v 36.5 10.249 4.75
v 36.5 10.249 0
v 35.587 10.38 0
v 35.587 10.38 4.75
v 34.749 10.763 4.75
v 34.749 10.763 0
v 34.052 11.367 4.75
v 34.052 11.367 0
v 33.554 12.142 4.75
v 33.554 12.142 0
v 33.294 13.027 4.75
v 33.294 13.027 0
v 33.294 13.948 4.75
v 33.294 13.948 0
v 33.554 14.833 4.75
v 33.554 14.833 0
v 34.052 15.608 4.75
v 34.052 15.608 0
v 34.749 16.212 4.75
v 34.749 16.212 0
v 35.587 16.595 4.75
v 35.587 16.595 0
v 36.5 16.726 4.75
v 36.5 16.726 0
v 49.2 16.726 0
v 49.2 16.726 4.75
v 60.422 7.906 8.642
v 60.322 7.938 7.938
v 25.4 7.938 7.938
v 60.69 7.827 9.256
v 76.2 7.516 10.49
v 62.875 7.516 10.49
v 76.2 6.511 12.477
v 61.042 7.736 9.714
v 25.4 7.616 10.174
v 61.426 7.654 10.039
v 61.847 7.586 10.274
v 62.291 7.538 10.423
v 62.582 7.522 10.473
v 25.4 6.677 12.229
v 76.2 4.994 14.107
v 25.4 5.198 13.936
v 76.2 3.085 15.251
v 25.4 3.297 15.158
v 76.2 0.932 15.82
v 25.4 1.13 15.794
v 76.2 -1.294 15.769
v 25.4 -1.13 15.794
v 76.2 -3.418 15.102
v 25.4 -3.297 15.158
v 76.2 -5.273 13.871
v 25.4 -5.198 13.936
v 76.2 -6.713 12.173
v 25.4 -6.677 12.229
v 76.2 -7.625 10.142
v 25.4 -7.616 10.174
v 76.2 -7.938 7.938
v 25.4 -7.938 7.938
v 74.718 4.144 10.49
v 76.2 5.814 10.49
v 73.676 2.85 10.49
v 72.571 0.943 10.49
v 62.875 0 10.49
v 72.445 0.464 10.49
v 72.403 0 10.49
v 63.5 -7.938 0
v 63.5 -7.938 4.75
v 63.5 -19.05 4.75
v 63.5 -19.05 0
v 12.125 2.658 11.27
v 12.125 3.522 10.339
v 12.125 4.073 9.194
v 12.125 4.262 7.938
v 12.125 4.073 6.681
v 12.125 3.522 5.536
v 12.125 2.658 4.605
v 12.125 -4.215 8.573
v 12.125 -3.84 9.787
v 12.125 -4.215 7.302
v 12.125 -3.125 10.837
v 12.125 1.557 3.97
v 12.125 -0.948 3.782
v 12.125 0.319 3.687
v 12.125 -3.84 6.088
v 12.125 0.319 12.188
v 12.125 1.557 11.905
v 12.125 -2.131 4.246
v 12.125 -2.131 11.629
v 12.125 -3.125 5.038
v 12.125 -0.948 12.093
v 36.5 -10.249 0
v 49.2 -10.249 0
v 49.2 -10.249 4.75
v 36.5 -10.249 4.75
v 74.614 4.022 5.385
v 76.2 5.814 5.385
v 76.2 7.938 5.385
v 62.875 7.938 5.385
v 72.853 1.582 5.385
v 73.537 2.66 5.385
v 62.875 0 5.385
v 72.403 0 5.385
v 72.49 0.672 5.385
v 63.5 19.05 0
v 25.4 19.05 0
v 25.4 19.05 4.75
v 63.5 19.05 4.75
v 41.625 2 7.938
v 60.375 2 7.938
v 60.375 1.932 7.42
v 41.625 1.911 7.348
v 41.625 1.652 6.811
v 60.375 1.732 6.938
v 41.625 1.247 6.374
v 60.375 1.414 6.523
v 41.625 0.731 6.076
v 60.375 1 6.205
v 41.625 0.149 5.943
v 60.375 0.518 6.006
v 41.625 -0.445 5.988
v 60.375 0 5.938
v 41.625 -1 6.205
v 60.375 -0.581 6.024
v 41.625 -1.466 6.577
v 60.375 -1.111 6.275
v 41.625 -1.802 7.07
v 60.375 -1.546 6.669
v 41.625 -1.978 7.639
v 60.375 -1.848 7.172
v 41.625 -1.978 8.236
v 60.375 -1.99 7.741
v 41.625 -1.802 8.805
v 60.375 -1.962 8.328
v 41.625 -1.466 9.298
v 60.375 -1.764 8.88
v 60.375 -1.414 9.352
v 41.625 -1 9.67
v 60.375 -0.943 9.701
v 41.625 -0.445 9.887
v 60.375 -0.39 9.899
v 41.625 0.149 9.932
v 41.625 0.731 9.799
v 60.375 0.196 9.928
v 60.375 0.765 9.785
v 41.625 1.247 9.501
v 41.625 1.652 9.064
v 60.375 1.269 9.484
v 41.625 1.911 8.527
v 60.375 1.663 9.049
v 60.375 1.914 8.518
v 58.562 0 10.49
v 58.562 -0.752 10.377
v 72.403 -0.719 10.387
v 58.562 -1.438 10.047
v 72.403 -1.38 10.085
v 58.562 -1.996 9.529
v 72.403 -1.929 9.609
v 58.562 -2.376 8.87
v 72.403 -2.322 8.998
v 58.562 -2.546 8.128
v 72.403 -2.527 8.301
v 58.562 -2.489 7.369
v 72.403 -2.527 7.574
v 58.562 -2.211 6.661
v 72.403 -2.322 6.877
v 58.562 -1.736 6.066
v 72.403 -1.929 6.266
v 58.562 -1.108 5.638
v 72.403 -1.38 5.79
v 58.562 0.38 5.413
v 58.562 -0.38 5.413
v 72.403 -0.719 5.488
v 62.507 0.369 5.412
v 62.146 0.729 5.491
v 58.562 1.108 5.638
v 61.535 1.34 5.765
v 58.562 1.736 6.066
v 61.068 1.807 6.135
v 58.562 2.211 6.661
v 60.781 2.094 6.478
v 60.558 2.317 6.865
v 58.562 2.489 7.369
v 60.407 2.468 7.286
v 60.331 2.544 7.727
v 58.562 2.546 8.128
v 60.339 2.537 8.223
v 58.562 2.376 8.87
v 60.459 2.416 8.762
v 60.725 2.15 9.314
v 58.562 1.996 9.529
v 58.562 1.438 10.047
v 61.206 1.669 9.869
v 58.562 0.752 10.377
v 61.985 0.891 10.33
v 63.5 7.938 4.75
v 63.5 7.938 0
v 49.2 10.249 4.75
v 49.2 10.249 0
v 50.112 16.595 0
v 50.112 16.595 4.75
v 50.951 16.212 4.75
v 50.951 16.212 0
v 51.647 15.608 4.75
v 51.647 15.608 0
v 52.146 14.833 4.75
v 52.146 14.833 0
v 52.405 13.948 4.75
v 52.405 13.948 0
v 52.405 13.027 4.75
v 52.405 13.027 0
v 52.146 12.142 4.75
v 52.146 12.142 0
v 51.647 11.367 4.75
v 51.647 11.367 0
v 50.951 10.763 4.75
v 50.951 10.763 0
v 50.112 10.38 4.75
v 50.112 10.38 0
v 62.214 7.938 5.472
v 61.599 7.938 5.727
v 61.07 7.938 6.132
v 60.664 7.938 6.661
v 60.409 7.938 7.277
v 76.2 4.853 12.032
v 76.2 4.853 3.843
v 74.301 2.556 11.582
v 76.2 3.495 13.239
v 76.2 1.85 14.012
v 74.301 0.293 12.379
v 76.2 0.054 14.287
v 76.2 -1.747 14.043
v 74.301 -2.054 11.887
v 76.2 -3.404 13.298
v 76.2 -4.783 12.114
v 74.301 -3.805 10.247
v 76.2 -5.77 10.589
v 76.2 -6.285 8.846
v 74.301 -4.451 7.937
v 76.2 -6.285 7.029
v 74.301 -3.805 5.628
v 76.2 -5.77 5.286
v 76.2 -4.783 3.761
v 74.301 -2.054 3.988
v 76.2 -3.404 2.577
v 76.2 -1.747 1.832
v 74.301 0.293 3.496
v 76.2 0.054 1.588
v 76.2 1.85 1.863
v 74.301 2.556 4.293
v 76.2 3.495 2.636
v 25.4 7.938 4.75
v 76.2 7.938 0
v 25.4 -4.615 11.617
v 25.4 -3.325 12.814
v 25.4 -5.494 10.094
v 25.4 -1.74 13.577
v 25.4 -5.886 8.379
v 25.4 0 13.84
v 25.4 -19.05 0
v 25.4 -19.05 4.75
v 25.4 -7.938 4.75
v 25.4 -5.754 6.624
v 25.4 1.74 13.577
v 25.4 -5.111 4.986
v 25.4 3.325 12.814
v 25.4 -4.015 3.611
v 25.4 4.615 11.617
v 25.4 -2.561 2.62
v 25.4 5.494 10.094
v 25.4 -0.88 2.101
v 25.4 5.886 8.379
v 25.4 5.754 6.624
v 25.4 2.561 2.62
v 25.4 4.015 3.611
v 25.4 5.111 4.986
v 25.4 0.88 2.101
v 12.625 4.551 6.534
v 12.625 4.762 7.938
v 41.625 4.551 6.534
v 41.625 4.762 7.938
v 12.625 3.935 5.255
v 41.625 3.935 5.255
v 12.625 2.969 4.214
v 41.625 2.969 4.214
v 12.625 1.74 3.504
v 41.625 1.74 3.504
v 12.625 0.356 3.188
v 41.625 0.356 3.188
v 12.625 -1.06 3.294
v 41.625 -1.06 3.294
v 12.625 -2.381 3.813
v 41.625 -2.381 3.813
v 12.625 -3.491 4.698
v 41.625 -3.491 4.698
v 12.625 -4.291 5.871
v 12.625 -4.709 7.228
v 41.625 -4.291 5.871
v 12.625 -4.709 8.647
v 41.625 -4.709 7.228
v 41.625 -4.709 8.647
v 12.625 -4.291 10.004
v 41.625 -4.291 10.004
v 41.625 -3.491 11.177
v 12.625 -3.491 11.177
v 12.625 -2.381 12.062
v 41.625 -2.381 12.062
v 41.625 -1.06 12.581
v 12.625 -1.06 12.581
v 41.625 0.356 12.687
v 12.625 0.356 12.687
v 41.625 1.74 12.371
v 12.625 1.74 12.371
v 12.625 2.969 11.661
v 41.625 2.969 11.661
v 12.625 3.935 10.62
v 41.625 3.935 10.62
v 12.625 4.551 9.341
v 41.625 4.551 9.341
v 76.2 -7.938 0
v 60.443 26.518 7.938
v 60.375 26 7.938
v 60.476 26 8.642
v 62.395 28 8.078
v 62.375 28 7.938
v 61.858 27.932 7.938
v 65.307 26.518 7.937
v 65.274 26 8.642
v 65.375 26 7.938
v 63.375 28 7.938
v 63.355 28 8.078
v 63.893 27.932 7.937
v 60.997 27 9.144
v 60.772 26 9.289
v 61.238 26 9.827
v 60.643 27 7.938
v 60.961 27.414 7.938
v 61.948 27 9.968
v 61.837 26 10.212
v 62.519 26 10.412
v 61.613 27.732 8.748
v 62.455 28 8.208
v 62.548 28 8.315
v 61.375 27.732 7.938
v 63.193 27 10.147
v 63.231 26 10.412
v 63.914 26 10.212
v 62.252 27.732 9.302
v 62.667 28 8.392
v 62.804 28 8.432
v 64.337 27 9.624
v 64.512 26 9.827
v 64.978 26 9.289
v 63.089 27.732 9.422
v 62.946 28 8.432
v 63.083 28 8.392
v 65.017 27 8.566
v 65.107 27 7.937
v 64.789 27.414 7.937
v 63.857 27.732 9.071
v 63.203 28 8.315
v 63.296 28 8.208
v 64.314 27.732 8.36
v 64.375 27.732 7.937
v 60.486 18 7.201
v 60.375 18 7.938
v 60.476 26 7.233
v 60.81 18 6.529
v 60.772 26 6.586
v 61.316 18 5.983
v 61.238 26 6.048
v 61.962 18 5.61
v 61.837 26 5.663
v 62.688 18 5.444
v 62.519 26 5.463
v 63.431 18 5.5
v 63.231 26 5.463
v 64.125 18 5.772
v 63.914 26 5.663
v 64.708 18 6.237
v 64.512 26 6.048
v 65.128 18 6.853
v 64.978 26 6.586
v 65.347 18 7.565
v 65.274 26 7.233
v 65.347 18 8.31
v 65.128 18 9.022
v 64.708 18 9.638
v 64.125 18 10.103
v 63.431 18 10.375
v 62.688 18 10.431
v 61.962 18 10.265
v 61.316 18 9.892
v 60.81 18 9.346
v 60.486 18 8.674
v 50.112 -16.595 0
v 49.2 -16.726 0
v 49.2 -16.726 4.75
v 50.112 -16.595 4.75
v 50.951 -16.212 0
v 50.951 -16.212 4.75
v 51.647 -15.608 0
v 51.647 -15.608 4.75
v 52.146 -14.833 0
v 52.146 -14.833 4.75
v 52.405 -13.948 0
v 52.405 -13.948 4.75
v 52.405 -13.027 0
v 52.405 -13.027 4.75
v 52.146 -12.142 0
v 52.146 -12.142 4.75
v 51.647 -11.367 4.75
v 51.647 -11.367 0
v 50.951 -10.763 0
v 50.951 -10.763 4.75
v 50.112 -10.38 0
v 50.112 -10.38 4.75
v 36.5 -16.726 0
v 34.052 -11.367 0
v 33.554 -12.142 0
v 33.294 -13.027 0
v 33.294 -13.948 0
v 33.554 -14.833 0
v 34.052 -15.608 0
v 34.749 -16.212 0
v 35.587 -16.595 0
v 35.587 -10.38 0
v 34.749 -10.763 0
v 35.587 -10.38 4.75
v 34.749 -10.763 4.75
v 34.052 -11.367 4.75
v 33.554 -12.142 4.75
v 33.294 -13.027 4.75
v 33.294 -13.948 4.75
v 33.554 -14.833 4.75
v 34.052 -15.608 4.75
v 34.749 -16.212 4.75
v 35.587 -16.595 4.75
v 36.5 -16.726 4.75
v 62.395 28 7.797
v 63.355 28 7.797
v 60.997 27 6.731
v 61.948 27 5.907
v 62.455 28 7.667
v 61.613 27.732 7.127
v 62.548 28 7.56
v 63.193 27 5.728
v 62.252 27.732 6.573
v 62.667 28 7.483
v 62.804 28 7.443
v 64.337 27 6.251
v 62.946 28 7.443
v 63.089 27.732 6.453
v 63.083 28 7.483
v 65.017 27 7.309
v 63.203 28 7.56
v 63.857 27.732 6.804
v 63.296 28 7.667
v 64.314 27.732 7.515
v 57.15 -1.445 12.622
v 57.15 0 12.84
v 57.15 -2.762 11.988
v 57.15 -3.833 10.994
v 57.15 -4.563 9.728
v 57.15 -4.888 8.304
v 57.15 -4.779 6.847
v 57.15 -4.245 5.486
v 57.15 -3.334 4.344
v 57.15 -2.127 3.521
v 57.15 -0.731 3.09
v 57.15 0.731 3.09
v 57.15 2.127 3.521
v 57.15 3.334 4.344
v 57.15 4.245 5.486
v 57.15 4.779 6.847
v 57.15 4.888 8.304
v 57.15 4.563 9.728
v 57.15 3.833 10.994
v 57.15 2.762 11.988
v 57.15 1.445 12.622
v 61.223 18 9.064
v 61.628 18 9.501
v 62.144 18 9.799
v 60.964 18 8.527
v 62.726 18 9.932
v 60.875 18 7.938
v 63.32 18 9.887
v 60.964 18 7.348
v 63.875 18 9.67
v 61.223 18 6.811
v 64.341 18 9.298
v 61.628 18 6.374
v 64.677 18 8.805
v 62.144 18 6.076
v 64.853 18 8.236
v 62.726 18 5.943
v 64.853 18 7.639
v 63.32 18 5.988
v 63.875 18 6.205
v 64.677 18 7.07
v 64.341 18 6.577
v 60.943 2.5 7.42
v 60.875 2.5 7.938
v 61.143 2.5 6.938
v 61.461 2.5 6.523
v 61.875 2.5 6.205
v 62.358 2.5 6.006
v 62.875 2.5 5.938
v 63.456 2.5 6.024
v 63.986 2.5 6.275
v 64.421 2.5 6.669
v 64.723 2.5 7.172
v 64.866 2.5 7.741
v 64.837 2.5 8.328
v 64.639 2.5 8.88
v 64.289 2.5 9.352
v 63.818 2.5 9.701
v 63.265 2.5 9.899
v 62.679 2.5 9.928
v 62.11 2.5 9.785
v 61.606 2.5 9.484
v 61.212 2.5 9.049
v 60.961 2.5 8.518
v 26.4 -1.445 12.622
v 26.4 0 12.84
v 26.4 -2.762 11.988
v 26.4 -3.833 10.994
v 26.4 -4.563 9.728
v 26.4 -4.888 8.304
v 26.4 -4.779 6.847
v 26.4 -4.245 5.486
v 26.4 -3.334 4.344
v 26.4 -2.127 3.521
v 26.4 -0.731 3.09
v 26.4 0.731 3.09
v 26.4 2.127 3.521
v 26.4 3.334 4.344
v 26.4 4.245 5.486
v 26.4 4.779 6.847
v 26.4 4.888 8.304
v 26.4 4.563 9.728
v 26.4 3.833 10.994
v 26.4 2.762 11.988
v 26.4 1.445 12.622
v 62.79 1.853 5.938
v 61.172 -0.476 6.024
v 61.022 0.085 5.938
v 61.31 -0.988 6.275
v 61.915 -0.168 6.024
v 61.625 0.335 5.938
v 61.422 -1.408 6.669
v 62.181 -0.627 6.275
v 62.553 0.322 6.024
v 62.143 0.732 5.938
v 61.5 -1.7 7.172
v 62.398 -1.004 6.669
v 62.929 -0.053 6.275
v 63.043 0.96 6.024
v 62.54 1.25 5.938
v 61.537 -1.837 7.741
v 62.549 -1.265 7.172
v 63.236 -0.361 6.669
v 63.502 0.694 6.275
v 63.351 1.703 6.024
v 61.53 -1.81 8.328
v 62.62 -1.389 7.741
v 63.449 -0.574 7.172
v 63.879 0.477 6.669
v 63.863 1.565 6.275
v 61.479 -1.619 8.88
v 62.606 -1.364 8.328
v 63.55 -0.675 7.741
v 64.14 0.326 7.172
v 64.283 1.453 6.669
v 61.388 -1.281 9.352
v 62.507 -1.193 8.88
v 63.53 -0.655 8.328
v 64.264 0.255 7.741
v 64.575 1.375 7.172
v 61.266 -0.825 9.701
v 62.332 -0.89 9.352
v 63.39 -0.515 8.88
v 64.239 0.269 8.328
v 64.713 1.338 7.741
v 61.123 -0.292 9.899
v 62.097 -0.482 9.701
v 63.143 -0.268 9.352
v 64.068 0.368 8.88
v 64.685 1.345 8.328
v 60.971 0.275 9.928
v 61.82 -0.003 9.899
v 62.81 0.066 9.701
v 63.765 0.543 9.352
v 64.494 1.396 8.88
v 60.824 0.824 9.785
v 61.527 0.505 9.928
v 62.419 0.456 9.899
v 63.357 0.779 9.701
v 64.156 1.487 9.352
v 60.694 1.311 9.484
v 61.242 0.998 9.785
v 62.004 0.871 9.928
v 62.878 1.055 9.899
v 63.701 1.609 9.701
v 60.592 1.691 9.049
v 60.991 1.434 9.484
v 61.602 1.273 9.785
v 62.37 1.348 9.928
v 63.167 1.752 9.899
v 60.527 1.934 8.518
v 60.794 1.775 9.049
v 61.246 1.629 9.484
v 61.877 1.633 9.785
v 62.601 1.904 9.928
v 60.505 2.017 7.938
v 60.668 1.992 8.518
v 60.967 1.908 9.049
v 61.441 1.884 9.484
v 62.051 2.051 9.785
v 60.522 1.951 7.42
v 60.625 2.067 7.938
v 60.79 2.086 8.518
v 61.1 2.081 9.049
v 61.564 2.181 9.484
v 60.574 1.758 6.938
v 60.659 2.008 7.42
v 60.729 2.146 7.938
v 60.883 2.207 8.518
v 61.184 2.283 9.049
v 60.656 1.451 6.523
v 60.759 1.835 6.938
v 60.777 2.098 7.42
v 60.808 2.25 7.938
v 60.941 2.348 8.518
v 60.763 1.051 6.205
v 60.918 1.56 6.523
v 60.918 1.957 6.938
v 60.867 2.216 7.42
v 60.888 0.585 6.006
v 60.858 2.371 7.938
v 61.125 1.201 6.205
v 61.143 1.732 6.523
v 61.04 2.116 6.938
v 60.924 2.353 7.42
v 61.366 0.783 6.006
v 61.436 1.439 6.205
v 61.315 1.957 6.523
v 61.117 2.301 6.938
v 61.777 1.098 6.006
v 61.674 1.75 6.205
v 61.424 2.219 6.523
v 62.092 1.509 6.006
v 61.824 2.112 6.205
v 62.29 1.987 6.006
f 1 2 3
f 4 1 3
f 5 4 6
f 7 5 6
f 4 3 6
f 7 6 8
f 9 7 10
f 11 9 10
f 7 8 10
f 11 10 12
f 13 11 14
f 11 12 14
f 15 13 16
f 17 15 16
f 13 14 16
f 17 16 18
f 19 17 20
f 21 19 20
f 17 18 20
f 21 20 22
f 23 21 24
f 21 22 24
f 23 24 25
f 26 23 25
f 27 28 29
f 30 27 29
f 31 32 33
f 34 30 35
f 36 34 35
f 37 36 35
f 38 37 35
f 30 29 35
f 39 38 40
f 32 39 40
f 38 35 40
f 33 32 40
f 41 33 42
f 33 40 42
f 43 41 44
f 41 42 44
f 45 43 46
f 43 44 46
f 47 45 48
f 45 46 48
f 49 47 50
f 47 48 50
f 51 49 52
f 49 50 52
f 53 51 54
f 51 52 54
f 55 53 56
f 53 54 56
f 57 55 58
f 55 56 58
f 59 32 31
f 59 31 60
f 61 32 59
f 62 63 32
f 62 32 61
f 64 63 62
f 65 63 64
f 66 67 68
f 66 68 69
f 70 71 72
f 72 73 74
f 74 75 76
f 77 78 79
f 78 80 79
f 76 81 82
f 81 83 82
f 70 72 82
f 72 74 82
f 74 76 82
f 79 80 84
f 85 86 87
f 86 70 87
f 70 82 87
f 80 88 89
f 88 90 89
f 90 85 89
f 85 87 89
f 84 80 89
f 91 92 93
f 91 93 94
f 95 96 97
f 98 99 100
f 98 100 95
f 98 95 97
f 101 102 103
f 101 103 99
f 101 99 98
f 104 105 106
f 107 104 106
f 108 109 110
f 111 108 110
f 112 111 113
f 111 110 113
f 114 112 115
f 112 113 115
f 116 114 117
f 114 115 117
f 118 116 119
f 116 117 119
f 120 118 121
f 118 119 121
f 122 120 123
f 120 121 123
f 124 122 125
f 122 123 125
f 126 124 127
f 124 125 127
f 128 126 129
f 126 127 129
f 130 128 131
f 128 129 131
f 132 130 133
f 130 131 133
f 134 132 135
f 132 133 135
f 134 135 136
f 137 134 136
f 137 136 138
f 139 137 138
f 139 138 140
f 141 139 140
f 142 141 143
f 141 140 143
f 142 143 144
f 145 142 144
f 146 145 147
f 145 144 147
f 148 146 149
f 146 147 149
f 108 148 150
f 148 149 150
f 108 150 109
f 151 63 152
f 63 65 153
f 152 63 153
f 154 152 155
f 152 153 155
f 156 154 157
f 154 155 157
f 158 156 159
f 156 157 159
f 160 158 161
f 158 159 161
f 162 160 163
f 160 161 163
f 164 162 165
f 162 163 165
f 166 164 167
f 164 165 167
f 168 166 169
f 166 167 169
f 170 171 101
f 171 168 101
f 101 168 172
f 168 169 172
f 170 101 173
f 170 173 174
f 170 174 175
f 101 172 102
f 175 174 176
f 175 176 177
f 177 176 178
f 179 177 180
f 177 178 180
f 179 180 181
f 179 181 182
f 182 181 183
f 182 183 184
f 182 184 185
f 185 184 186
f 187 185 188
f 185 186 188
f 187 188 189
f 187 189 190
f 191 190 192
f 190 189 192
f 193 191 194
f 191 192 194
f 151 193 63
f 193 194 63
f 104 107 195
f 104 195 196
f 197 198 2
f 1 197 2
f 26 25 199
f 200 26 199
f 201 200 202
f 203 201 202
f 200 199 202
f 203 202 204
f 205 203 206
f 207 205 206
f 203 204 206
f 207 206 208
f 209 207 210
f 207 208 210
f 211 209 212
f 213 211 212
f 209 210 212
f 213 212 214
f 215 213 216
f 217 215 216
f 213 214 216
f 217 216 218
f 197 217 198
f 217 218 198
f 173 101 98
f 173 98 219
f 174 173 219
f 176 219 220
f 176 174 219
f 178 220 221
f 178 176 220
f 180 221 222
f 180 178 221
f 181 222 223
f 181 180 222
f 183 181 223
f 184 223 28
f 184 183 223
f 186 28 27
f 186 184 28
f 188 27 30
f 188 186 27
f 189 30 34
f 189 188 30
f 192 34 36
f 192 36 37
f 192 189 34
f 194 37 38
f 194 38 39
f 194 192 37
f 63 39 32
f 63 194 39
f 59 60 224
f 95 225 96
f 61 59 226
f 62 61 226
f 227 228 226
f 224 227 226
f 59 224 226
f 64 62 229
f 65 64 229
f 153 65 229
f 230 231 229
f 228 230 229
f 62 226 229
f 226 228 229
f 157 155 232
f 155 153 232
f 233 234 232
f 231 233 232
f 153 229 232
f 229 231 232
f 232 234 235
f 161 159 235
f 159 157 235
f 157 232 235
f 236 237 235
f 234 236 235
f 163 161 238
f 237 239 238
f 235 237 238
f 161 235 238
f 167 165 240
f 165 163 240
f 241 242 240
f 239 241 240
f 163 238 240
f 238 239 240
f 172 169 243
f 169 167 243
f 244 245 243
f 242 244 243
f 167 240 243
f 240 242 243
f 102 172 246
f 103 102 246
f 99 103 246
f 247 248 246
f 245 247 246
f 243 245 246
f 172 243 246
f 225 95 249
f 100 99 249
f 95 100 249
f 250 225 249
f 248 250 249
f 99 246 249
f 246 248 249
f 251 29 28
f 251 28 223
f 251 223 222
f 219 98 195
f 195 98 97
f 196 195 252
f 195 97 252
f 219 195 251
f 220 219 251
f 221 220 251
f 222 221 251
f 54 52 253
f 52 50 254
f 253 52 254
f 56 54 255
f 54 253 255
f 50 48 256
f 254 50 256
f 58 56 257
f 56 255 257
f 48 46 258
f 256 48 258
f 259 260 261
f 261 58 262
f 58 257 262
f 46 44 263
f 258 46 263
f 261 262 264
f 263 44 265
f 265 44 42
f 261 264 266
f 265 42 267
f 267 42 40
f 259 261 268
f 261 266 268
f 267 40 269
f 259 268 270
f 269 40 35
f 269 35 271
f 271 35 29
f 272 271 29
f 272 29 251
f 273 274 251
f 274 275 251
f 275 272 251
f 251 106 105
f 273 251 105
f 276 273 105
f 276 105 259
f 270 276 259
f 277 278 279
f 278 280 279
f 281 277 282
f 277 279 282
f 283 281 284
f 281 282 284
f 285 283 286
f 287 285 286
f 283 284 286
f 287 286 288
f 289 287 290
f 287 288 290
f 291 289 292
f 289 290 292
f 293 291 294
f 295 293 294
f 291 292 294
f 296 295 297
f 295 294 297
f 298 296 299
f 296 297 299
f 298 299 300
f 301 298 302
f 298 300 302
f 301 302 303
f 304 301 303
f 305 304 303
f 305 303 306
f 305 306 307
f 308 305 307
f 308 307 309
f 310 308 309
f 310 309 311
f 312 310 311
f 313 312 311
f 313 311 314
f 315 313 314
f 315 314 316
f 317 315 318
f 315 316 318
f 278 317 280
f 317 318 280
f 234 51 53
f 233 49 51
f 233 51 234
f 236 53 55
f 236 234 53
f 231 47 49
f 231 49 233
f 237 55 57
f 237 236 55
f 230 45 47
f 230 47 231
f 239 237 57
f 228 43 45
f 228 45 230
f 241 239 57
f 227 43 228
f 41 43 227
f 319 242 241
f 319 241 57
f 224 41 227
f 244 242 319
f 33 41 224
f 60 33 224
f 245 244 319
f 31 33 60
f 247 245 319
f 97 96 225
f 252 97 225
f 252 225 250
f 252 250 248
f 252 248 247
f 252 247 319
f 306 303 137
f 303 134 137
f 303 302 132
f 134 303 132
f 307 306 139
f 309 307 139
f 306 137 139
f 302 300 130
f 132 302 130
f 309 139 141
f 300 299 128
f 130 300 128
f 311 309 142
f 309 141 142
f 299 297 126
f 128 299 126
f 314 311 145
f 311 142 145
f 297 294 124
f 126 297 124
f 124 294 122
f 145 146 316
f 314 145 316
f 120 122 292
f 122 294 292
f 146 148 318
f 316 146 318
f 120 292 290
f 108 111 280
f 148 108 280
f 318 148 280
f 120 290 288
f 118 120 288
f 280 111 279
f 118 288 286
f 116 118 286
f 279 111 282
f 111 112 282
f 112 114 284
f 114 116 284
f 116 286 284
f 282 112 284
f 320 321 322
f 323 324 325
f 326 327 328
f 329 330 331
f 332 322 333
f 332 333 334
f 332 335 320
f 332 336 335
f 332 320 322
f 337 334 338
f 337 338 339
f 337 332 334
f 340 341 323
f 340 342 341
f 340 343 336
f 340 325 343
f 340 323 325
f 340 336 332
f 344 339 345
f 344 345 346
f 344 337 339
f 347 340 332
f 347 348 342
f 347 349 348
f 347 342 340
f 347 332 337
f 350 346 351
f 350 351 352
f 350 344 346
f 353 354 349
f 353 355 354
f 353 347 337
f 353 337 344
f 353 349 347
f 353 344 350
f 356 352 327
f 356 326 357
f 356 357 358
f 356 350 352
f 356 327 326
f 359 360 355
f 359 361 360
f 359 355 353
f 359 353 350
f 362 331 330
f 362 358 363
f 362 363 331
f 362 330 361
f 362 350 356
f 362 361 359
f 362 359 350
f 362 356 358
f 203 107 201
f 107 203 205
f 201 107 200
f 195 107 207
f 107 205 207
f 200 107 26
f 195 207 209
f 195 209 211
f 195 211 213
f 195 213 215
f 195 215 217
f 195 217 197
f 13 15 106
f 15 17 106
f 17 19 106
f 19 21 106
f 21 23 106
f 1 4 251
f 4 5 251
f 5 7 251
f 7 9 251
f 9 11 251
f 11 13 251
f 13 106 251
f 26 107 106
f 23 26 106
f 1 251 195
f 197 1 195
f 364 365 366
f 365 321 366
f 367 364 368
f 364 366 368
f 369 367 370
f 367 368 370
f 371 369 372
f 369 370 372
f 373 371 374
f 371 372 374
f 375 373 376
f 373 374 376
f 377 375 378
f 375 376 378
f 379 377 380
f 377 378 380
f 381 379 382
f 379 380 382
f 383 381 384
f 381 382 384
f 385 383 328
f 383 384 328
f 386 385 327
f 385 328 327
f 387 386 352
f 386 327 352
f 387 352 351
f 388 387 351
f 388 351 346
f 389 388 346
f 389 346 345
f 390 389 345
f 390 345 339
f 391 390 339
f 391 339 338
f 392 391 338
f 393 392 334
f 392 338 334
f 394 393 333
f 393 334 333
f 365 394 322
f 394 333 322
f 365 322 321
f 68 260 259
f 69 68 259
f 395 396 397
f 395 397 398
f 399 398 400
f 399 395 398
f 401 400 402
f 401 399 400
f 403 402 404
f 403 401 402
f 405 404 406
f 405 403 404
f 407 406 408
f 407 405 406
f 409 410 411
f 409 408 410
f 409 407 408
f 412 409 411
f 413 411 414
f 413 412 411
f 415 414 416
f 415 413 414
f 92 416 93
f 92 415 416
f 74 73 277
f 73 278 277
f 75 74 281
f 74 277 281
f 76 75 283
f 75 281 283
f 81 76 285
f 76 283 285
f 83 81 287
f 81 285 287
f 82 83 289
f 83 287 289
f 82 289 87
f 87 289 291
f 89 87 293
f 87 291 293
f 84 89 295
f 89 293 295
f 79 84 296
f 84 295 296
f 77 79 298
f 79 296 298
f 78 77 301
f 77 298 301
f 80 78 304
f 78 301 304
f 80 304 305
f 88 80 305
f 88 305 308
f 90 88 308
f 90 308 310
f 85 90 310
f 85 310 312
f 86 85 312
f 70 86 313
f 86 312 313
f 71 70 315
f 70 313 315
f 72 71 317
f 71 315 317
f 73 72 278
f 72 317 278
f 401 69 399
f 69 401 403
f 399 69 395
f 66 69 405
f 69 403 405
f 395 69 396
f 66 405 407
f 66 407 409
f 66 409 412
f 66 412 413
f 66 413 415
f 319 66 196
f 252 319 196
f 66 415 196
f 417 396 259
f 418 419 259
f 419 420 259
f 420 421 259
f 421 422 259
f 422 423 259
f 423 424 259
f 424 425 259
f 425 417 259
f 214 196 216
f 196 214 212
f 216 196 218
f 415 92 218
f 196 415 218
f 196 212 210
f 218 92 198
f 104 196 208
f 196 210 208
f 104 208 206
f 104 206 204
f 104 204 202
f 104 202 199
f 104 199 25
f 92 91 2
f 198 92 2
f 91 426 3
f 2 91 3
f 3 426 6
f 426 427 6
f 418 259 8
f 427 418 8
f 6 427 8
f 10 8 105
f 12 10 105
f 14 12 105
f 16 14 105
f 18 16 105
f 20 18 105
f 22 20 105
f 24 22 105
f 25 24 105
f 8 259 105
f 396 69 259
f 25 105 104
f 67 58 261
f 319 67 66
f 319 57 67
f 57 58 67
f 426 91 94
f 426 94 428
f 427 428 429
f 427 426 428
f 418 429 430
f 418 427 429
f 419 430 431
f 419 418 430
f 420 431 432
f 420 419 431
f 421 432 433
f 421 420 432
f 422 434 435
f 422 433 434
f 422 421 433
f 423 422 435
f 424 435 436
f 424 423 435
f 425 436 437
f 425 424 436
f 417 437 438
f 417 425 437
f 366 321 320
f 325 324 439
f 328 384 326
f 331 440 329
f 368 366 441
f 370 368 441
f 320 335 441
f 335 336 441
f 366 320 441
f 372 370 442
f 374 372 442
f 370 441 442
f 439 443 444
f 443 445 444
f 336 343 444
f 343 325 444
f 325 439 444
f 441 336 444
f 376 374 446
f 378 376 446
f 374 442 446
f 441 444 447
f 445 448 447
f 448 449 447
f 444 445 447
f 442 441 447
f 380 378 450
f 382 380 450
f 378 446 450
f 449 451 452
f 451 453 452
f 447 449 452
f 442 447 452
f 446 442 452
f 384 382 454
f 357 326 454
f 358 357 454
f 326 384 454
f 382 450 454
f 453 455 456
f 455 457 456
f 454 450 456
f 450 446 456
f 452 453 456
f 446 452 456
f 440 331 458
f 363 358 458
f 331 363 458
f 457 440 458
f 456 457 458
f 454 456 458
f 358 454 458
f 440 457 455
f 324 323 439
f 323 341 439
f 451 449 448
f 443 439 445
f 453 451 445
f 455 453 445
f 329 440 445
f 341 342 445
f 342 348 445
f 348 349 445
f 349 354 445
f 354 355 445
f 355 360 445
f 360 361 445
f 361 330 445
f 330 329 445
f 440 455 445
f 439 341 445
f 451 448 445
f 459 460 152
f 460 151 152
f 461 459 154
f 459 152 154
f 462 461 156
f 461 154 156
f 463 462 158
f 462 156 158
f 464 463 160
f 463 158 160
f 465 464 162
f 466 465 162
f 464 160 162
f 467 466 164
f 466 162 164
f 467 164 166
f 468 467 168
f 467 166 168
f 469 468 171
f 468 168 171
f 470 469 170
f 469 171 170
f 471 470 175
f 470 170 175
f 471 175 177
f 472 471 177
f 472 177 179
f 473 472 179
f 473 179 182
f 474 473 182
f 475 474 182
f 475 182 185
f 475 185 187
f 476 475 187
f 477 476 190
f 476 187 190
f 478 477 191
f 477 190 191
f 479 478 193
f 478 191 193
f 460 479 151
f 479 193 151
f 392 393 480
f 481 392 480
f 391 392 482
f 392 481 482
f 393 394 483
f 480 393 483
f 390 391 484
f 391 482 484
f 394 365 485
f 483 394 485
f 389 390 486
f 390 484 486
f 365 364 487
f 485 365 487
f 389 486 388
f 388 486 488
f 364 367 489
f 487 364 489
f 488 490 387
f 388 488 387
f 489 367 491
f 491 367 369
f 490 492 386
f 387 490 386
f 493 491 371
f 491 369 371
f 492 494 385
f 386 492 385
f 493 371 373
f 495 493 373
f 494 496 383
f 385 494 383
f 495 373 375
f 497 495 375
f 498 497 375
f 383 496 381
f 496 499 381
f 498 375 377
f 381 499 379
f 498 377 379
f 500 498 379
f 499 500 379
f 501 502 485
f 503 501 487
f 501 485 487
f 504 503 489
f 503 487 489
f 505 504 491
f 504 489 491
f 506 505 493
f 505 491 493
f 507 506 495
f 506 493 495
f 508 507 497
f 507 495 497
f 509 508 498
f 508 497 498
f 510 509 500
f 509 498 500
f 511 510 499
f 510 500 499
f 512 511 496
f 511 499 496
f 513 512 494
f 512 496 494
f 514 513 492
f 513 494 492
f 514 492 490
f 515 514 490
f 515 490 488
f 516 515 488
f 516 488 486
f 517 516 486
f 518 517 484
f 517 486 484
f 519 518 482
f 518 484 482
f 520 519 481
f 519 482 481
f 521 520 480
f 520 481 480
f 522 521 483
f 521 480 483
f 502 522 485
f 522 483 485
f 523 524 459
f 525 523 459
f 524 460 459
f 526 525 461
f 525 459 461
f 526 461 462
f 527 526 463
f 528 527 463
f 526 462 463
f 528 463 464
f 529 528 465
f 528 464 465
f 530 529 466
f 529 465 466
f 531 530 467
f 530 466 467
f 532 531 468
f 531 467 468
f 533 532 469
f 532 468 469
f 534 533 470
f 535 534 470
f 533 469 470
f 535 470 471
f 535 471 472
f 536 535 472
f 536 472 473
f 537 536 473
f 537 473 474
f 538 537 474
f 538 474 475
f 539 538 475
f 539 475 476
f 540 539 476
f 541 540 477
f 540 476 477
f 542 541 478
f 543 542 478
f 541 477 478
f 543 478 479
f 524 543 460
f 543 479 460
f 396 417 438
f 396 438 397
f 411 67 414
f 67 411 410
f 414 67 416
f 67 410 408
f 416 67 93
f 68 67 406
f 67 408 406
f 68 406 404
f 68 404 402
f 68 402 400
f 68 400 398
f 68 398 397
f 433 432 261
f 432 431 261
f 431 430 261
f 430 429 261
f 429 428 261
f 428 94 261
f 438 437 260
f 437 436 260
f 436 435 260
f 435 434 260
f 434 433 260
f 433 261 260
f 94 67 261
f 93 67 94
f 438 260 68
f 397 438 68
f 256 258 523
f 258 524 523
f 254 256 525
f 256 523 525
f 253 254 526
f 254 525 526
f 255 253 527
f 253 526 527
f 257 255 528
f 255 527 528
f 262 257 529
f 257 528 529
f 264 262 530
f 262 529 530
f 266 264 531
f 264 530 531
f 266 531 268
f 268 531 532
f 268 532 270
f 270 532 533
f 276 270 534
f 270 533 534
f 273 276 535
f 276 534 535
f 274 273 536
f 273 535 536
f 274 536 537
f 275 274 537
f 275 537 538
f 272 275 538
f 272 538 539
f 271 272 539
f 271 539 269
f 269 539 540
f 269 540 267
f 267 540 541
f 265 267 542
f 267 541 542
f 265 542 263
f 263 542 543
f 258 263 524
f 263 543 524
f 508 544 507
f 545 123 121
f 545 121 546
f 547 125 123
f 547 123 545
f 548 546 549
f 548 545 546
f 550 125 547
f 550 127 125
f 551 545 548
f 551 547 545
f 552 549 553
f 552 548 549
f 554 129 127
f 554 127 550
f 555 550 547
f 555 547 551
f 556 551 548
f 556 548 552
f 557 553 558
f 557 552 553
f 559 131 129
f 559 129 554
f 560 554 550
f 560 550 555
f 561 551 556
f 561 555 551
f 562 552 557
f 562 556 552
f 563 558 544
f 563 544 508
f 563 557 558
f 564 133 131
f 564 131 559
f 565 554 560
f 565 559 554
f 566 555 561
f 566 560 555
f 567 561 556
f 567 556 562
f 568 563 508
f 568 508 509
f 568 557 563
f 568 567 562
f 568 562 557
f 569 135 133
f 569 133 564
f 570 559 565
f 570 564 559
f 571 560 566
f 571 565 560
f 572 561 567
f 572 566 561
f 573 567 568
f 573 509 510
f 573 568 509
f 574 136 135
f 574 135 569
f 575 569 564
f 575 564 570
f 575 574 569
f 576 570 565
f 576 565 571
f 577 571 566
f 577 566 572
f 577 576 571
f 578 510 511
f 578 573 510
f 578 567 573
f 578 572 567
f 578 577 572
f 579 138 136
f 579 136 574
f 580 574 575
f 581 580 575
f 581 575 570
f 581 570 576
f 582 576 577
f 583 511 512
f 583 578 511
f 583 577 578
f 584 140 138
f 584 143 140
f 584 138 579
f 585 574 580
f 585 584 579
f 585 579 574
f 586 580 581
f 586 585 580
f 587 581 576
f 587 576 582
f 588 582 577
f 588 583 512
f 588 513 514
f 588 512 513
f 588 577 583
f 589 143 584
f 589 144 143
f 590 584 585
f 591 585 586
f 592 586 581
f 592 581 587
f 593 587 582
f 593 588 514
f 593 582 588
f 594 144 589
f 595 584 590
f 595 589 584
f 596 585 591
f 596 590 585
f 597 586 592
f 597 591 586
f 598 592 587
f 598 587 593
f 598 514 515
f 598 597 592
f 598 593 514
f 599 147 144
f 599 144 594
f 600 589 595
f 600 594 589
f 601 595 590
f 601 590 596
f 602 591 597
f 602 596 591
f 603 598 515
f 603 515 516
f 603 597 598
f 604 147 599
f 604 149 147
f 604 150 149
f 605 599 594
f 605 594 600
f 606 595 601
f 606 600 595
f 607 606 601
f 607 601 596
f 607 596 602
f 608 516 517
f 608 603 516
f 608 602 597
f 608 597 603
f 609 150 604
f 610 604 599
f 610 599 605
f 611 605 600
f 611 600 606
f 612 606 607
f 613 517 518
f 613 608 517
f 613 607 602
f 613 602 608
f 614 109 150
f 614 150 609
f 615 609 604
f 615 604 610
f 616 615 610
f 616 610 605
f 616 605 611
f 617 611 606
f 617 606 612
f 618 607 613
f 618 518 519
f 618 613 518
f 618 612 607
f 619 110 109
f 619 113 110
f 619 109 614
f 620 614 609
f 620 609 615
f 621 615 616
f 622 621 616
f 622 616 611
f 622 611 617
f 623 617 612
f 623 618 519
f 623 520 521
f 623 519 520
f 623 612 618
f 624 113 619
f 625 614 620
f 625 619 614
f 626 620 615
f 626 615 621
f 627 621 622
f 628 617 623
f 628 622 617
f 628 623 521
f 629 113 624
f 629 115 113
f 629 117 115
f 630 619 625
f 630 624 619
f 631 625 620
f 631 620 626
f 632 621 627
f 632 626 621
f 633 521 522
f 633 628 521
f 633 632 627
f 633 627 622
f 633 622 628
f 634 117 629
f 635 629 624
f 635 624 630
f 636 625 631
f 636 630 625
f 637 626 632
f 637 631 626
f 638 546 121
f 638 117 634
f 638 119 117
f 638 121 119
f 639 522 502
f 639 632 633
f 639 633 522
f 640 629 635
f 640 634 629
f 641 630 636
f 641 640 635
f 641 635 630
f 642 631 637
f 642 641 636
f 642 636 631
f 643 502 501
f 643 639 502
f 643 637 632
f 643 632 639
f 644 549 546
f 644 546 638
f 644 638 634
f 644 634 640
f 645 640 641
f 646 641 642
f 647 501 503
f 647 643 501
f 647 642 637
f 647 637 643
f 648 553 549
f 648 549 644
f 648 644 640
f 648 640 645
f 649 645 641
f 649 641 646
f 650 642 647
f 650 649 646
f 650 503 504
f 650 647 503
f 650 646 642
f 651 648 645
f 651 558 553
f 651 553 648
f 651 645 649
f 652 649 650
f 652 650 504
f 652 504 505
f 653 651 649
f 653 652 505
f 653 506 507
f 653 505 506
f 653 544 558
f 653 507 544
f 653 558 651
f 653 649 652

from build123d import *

# Parameters (mm, degrees)
BOSS_EXTRUDE2_DEPTH = 50.8
SKETCH5_W           = 4.7498
SKETCH5_H           = 11.1125
CUT_EXTRUDE3_DEPTH  = 12.7
CUT_REVOLVE2_ANGLE  = 360
CUT_EXTRUDE4_REACH  = 21.05
CUT_EXTRUDE5_REACH  = 17.875
REVOLVE1_ANGLE      = 360
REVOLVE2_ANGLE      = 360
SKETCH12_R          = 2


with BuildPart() as part:
    # Sketch4 → Boss-Extrude2 (new body)
    with BuildSketch(Plane(origin=(25.4, 0, 0), x_dir=(0, 0, -1), z_dir=(1, 0, 0))):
        with BuildLine():
            Line((0, -19.05), (0, 19.05))
            Line((0, 19.05), (-4.7498, 19.05))
            Line((-4.7498, 19.05), (-4.7498, 7.9375))
            Line((-4.7498, 7.9375), (-7.9375, 7.9375))
            ThreePointArc((-7.9375, 7.9375), (-15.875, 0), (-7.9375, -7.9375))
            Line((-7.9375, -7.9375), (-4.7498, -7.9375))
            Line((-4.7498, -7.9375), (-4.7498, -19.05))
            Line((-4.7498, -19.05), (0, -19.05))
        make_face()
    extrude(amount=BOSS_EXTRUDE2_DEPTH)

    # Sketch5 → Cut-Extrude3 (cut)
    with BuildSketch(Plane(origin=(76.2, 0, 0), x_dir=(0, 0, -1), z_dir=(1, 0, 0))):
        with Locations((-2.3749, 13.49375)):
            Rectangle(SKETCH5_W, SKETCH5_H)
        with Locations((-2.3749, -13.49375)):
            Rectangle(SKETCH5_W, SKETCH5_H)
    extrude(amount=-CUT_EXTRUDE3_DEPTH, mode=Mode.SUBTRACT)

    # Sketch6 → Cut-Revolve2 (revolve, symmetric, cut)
    with BuildSketch(Plane(origin=(0, 0, 0), x_dir=(1, 0, 0), z_dir=(0, 1, 0))) as cut_revolve2_sk:
        Polygon((25.4, -7.9375), (25.4, -13.8397), (26.4, -12.8397), (57.15, -12.8397), (58.561722024, -10.4902), (72.4027, -10.4902), (76.2, -14.2875), (76.2, -7.9375), align=None)
    revolve(axis=Axis((25.4, 0, 7.9375), (1, 0, 0)), revolution_arc=CUT_REVOLVE2_ANGLE / 2, mode=Mode.SUBTRACT)
    revolve(cut_revolve2_sk.sketch, axis=Axis((25.4, 0, 7.9375), (-1, 0, 0)), revolution_arc=CUT_REVOLVE2_ANGLE / 2, mode=Mode.SUBTRACT)

    # Sketch7 → Cut-Extrude4 (cut, up to next)
    with BuildSketch(Plane(origin=(0, 0, 0), x_dir=(1, 0, 0), z_dir=(0, 1, 0)), mode=Mode.PRIVATE) as cut_extrude4_sk1:
        with BuildLine():
            Line((62.87516, -10.4902), (76.2, -10.4902))
            Line((76.2, -10.4902), (76.2, -5.3848))
            Line((76.2, -5.3848), (62.87516, -5.3848))
            ThreePointArc((62.87516, -5.3848), (60.32246, -7.9375), (62.87516, -10.4902))
        make_face()
    cut_extrude4_tool1 = extrude(cut_extrude4_sk1.sketch, amount=CUT_EXTRUDE4_REACH, mode=Mode.PRIVATE) & part.part
    add(cut_extrude4_tool1.solids().sort_by_distance((68.524549, 0, 7.9375))[0], mode=Mode.SUBTRACT)

    # Sketch8 → Cut-Extrude5 (cut, up to next)
    with BuildSketch(Plane.XY, mode=Mode.PRIVATE) as cut_extrude5_sk1:
        with BuildLine():
            Line((36.4998, 16.7259), (49.1998, 16.7259))
            ThreePointArc((49.1998, 16.7259), (52.4383, 13.4874), (49.1998, 10.2489))
            Line((49.1998, 10.2489), (36.4998, 10.2489))
            ThreePointArc((36.4998, 10.2489), (33.2613, 13.4874), (36.4998, 16.7259))
        make_face()
    cut_extrude5_tool1 = extrude(cut_extrude5_sk1.sketch, amount=CUT_EXTRUDE5_REACH, mode=Mode.PRIVATE) & part.part
    add(cut_extrude5_tool1.solids().sort_by_distance((42.8498, 13.4874, 0))[0], mode=Mode.SUBTRACT)
    # Sketch8 → Cut-Extrude5 (cut, up to next)
    with BuildSketch(Plane.XY, mode=Mode.PRIVATE) as cut_extrude5_sk2:
        with BuildLine():
            Line((36.4998, -16.7259), (49.1998, -16.7259))
            ThreePointArc((49.1998, -16.7259), (52.4383, -13.4874), (49.1998, -10.2489))
            Line((49.1998, -10.2489), (36.4998, -10.2489))
            ThreePointArc((36.4998, -10.2489), (33.2613, -13.4874), (36.4998, -16.7259))
        make_face()
    cut_extrude5_tool2 = extrude(cut_extrude5_sk2.sketch, amount=CUT_EXTRUDE5_REACH, mode=Mode.PRIVATE) & part.part
    add(cut_extrude5_tool2.solids().sort_by_distance((42.8498, -13.4874, 0))[0], mode=Mode.SUBTRACT)


with BuildPart() as body_2:
    # Sketch9 → Revolve1 (revolve, symmetric)
    with BuildSketch(Plane.XY.offset(7.9375)) as revolve1_sk:
        Polygon((12.12516, 0), (12.12516, 4.2625), (12.62516, 4.7625), (41.62516, 4.7625), (41.62516, 2), (60.37516, 2), (60.37516, 0), align=None)
    revolve(axis=Axis((12.12516, 0, 7.9375), (1, 0, 0)), revolution_arc=REVOLVE1_ANGLE / 2)
    revolve(revolve1_sk.sketch, axis=Axis((12.12516, 0, 7.9375), (-1, 0, 0)), revolution_arc=REVOLVE1_ANGLE / 2)



with BuildPart() as body_3:
    # Sketch11 → Revolve2 (revolve, symmetric)
    with BuildSketch(Plane.XY.offset(7.9375)) as revolve2_sk:
        with BuildLine():
            Line((60.87516, 2.5), (60.87516, 18))
            Line((60.87516, 18), (60.37516, 18))
            Line((60.37516, 18), (60.37516, 26))
            ThreePointArc((60.37516, 26), (60.960946438, 27.414213562), (62.37516, 28))
            Line((62.37516, 28), (62.87516, 28))
            Line((62.87516, 28), (62.87516, 2.5))
            Line((62.87516, 2.5), (60.87516, 2.5))
        make_face()
    revolve(axis=Axis((62.87516, 2.5, 7.9375), (0, 1, 0)), revolution_arc=REVOLVE2_ANGLE / 2)
    revolve(revolve2_sk.sketch, axis=Axis((62.87516, 2.5, 7.9375), (0, -1, 0)), revolution_arc=REVOLVE2_ANGLE / 2)


with BuildPart() as body_2_1:
    add(body_2.part)

    add(body_3.part)  # Sweep1 merges body 3
    # Sweep1: sweep along a path in Sketch13
    with BuildLine(Plane.XY.offset(7.9375)) as sweep1_path:
        ThreePointArc((60.37516, 0), (62.142926953, 0.732233047), (62.87516, 2.5))
    # Sketch12 → Sweep1 (sweep)
    with BuildSketch(Plane(origin=(60.37516, 0, 0), x_dir=(0, 0, -1), z_dir=(1, 0, 0))):
        with Locations((-7.9375, 0)):
            Circle(SKETCH12_R)
    sweep(path=sweep1_path.line)


solid = Compound([part.part, body_2_1.part])
